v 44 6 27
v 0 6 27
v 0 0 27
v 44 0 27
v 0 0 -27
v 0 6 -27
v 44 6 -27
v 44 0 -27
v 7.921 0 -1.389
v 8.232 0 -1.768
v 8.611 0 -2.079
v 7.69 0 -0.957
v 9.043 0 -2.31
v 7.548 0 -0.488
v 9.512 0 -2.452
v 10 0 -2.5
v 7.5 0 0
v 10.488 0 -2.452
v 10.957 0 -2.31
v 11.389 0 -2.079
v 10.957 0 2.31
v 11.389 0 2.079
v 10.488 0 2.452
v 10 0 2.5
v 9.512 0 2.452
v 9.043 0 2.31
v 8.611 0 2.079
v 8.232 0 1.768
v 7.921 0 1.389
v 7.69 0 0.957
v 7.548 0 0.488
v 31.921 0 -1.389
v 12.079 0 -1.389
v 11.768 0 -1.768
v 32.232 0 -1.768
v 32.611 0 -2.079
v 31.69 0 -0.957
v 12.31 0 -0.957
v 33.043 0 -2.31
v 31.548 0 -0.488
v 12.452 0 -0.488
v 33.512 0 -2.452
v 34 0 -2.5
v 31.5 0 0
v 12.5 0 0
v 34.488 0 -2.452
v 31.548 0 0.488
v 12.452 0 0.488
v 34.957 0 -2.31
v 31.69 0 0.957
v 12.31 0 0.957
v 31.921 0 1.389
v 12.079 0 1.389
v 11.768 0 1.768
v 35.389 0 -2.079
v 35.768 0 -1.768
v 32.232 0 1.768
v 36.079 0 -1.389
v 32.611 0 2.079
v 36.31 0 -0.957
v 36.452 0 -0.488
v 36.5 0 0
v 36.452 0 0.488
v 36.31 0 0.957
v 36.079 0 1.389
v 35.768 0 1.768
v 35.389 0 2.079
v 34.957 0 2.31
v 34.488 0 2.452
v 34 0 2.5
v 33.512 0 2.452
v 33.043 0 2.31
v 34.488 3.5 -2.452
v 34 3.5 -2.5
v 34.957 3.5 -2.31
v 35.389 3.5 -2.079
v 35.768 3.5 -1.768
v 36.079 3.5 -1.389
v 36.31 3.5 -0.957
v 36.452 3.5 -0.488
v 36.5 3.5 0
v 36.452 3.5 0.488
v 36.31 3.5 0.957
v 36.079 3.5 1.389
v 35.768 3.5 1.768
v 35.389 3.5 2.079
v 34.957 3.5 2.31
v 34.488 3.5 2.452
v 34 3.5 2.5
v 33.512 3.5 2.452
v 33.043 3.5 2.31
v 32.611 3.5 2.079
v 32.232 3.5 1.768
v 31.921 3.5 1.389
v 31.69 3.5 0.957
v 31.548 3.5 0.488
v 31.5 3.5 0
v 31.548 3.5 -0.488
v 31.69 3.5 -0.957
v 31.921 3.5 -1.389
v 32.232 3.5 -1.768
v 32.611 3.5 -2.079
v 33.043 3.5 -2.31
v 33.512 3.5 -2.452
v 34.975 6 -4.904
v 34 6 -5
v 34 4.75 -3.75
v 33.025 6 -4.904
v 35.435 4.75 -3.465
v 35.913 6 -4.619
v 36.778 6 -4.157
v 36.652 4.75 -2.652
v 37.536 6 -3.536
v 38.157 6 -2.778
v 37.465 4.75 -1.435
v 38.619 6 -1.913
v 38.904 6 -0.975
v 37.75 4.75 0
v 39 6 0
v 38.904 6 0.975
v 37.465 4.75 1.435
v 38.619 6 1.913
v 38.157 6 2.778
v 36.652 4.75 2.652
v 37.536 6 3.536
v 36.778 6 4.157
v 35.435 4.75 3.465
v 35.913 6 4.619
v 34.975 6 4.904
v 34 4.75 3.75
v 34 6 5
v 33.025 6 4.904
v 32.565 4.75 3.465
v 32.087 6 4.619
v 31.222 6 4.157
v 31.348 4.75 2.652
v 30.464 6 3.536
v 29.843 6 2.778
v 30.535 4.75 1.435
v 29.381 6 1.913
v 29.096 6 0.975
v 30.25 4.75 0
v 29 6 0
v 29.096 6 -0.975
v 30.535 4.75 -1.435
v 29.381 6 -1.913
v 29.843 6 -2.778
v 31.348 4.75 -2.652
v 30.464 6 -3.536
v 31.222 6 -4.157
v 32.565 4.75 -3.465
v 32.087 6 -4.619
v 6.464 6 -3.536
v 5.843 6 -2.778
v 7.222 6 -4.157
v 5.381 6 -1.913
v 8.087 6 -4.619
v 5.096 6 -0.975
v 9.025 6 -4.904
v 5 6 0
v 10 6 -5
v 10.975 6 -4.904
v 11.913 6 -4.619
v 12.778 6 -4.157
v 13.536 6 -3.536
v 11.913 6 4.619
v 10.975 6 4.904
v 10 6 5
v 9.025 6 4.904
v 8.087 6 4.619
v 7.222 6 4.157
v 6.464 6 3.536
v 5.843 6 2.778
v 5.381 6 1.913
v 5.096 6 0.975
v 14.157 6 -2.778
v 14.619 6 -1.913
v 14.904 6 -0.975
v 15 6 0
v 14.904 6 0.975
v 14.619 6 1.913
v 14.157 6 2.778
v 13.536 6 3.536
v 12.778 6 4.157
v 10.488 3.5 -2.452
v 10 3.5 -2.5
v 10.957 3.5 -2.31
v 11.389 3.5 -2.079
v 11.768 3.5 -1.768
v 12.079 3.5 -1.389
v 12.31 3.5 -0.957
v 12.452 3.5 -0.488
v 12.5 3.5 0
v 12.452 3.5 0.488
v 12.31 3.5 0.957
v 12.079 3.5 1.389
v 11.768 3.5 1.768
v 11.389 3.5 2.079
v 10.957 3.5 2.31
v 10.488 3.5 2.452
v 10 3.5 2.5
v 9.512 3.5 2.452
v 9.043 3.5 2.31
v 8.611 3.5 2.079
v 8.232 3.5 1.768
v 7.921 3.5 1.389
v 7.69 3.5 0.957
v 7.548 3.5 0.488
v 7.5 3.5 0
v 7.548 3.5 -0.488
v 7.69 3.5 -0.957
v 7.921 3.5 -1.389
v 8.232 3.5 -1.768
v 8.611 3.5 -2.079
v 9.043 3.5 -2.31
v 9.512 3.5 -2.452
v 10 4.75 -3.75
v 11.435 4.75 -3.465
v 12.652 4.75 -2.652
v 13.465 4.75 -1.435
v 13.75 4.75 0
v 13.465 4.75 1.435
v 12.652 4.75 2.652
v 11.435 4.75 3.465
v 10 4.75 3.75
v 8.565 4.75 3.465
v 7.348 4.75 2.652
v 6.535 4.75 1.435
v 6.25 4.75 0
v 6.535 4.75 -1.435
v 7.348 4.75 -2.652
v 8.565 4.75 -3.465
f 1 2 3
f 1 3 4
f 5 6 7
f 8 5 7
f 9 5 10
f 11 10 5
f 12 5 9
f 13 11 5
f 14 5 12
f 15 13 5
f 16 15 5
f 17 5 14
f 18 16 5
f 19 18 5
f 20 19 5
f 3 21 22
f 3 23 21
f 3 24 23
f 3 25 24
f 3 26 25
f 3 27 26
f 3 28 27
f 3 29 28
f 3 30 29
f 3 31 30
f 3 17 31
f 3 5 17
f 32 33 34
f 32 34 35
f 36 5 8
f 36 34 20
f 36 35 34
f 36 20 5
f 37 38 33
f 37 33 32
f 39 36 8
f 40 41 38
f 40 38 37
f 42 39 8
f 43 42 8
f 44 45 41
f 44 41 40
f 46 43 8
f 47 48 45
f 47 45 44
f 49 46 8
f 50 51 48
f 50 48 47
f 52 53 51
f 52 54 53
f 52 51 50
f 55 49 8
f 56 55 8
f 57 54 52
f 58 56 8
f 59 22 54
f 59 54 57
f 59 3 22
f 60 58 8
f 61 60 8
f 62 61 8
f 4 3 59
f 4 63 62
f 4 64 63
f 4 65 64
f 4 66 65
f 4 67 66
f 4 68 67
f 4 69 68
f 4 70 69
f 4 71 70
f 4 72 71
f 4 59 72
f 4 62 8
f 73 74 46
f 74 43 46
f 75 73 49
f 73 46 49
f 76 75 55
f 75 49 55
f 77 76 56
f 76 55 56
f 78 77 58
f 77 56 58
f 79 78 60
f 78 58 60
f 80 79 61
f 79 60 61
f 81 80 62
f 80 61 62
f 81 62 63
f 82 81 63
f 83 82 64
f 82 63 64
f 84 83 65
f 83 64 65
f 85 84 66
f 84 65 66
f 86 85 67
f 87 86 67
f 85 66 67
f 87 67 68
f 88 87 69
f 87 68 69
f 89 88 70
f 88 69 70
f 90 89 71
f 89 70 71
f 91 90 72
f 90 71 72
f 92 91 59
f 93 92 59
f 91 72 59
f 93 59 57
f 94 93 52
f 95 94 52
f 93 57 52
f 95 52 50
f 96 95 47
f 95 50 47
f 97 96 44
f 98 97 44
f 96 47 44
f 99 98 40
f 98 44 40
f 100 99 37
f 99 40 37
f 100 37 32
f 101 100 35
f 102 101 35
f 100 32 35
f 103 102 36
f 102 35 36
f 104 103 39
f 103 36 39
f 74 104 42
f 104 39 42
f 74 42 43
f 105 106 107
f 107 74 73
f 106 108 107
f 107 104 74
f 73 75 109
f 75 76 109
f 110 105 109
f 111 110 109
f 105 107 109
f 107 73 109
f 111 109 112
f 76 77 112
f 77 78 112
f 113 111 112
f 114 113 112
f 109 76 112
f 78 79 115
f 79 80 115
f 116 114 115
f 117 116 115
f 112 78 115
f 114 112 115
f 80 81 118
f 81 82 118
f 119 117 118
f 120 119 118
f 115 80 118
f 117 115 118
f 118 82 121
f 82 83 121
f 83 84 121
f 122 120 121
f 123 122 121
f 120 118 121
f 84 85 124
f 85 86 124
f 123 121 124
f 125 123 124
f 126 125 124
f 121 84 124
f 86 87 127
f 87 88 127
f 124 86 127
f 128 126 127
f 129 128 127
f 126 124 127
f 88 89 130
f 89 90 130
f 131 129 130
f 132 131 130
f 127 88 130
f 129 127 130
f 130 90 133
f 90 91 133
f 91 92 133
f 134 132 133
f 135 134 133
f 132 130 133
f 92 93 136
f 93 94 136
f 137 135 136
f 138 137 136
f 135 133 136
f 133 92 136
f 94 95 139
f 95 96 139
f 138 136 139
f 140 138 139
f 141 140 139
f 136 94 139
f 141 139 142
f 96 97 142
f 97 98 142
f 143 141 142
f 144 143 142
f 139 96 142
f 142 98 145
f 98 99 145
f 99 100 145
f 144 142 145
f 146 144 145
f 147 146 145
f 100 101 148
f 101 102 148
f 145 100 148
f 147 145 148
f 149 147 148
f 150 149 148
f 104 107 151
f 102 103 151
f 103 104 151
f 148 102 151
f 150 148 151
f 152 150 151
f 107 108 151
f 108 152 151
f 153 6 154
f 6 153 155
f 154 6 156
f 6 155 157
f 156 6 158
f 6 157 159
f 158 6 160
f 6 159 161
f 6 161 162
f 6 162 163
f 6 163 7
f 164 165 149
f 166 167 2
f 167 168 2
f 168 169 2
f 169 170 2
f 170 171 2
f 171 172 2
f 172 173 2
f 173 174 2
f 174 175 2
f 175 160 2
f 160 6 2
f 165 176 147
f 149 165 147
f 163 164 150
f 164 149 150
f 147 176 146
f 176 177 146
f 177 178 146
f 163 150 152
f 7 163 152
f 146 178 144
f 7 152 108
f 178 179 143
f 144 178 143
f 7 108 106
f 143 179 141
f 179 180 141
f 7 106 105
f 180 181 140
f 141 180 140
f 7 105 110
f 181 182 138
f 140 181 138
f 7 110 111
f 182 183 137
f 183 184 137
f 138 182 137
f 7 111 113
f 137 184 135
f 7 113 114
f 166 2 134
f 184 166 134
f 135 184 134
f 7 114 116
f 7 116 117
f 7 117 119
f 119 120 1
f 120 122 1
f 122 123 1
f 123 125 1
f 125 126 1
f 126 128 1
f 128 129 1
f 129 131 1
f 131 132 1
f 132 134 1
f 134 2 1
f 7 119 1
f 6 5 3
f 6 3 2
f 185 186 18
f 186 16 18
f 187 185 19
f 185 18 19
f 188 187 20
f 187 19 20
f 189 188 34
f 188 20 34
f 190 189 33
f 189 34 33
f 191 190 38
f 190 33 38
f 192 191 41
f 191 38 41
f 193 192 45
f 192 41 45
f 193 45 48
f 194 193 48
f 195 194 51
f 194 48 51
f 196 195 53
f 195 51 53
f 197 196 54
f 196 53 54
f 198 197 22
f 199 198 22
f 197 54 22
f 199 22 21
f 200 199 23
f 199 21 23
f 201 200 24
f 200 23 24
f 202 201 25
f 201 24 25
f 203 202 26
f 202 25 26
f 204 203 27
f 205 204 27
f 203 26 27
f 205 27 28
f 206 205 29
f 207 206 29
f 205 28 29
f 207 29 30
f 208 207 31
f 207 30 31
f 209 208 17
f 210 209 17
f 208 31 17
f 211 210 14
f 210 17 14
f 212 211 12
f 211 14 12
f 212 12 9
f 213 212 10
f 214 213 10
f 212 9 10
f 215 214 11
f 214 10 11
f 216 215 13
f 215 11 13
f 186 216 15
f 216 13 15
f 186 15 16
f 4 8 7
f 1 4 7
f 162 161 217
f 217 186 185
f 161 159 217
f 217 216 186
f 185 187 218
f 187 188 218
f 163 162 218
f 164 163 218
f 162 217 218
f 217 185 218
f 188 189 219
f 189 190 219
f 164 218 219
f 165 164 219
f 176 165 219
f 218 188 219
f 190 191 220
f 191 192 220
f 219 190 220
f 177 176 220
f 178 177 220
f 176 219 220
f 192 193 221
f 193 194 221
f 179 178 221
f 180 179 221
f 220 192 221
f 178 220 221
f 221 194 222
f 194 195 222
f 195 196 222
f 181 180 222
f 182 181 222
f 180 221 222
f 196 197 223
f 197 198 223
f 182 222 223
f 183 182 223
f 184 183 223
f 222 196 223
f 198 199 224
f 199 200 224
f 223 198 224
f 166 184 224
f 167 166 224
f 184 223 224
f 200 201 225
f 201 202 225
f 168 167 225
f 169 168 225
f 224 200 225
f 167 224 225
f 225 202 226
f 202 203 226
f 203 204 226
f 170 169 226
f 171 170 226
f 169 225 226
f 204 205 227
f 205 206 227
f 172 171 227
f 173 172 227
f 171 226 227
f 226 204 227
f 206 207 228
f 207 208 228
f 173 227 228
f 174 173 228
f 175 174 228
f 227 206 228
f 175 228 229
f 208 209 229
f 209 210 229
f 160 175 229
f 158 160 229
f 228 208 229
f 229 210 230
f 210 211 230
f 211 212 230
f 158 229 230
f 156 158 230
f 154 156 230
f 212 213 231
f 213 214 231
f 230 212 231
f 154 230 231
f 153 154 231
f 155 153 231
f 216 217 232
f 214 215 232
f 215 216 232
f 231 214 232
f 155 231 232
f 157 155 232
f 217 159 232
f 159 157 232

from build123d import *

# Parameters (mm, degrees)
SKETCH1_W                                       = 44
SKETCH1_H                                       = 6
EXTRUDE1_DEPTH                                  = 27
CSK_FOR_M6_FLAT_HEAD_MACHINE_SCREW1_D           = 5
CSK_FOR_M6_FLAT_HEAD_MACHINE_SCREW1_CSINK_D     = 10
CSK_FOR_M6_FLAT_HEAD_MACHINE_SCREW1_CSINK_ANGLE = 90


with BuildPart() as part:
    # Sketch1 → Extrude1 (new, symmetric)
    with BuildSketch(Plane.XY):
        with Locations((22, 3)):
            Rectangle(SKETCH1_W, SKETCH1_H)
    extrude(amount=EXTRUDE1_DEPTH, both=True)

    # CSK for M6 Flat Head Machine Screw1 (through all)
    with Locations(Plane(origin=(10, 6, 0), x_dir=(0, 0, 1), z_dir=(0, 1, 0))):
        with Locations((0, 0), (0, 24)):
            CounterSinkHole(CSK_FOR_M6_FLAT_HEAD_MACHINE_SCREW1_D / 2, CSK_FOR_M6_FLAT_HEAD_MACHINE_SCREW1_CSINK_D / 2, counter_sink_angle=CSK_FOR_M6_FLAT_HEAD_MACHINE_SCREW1_CSINK_ANGLE)


solid = part.part
